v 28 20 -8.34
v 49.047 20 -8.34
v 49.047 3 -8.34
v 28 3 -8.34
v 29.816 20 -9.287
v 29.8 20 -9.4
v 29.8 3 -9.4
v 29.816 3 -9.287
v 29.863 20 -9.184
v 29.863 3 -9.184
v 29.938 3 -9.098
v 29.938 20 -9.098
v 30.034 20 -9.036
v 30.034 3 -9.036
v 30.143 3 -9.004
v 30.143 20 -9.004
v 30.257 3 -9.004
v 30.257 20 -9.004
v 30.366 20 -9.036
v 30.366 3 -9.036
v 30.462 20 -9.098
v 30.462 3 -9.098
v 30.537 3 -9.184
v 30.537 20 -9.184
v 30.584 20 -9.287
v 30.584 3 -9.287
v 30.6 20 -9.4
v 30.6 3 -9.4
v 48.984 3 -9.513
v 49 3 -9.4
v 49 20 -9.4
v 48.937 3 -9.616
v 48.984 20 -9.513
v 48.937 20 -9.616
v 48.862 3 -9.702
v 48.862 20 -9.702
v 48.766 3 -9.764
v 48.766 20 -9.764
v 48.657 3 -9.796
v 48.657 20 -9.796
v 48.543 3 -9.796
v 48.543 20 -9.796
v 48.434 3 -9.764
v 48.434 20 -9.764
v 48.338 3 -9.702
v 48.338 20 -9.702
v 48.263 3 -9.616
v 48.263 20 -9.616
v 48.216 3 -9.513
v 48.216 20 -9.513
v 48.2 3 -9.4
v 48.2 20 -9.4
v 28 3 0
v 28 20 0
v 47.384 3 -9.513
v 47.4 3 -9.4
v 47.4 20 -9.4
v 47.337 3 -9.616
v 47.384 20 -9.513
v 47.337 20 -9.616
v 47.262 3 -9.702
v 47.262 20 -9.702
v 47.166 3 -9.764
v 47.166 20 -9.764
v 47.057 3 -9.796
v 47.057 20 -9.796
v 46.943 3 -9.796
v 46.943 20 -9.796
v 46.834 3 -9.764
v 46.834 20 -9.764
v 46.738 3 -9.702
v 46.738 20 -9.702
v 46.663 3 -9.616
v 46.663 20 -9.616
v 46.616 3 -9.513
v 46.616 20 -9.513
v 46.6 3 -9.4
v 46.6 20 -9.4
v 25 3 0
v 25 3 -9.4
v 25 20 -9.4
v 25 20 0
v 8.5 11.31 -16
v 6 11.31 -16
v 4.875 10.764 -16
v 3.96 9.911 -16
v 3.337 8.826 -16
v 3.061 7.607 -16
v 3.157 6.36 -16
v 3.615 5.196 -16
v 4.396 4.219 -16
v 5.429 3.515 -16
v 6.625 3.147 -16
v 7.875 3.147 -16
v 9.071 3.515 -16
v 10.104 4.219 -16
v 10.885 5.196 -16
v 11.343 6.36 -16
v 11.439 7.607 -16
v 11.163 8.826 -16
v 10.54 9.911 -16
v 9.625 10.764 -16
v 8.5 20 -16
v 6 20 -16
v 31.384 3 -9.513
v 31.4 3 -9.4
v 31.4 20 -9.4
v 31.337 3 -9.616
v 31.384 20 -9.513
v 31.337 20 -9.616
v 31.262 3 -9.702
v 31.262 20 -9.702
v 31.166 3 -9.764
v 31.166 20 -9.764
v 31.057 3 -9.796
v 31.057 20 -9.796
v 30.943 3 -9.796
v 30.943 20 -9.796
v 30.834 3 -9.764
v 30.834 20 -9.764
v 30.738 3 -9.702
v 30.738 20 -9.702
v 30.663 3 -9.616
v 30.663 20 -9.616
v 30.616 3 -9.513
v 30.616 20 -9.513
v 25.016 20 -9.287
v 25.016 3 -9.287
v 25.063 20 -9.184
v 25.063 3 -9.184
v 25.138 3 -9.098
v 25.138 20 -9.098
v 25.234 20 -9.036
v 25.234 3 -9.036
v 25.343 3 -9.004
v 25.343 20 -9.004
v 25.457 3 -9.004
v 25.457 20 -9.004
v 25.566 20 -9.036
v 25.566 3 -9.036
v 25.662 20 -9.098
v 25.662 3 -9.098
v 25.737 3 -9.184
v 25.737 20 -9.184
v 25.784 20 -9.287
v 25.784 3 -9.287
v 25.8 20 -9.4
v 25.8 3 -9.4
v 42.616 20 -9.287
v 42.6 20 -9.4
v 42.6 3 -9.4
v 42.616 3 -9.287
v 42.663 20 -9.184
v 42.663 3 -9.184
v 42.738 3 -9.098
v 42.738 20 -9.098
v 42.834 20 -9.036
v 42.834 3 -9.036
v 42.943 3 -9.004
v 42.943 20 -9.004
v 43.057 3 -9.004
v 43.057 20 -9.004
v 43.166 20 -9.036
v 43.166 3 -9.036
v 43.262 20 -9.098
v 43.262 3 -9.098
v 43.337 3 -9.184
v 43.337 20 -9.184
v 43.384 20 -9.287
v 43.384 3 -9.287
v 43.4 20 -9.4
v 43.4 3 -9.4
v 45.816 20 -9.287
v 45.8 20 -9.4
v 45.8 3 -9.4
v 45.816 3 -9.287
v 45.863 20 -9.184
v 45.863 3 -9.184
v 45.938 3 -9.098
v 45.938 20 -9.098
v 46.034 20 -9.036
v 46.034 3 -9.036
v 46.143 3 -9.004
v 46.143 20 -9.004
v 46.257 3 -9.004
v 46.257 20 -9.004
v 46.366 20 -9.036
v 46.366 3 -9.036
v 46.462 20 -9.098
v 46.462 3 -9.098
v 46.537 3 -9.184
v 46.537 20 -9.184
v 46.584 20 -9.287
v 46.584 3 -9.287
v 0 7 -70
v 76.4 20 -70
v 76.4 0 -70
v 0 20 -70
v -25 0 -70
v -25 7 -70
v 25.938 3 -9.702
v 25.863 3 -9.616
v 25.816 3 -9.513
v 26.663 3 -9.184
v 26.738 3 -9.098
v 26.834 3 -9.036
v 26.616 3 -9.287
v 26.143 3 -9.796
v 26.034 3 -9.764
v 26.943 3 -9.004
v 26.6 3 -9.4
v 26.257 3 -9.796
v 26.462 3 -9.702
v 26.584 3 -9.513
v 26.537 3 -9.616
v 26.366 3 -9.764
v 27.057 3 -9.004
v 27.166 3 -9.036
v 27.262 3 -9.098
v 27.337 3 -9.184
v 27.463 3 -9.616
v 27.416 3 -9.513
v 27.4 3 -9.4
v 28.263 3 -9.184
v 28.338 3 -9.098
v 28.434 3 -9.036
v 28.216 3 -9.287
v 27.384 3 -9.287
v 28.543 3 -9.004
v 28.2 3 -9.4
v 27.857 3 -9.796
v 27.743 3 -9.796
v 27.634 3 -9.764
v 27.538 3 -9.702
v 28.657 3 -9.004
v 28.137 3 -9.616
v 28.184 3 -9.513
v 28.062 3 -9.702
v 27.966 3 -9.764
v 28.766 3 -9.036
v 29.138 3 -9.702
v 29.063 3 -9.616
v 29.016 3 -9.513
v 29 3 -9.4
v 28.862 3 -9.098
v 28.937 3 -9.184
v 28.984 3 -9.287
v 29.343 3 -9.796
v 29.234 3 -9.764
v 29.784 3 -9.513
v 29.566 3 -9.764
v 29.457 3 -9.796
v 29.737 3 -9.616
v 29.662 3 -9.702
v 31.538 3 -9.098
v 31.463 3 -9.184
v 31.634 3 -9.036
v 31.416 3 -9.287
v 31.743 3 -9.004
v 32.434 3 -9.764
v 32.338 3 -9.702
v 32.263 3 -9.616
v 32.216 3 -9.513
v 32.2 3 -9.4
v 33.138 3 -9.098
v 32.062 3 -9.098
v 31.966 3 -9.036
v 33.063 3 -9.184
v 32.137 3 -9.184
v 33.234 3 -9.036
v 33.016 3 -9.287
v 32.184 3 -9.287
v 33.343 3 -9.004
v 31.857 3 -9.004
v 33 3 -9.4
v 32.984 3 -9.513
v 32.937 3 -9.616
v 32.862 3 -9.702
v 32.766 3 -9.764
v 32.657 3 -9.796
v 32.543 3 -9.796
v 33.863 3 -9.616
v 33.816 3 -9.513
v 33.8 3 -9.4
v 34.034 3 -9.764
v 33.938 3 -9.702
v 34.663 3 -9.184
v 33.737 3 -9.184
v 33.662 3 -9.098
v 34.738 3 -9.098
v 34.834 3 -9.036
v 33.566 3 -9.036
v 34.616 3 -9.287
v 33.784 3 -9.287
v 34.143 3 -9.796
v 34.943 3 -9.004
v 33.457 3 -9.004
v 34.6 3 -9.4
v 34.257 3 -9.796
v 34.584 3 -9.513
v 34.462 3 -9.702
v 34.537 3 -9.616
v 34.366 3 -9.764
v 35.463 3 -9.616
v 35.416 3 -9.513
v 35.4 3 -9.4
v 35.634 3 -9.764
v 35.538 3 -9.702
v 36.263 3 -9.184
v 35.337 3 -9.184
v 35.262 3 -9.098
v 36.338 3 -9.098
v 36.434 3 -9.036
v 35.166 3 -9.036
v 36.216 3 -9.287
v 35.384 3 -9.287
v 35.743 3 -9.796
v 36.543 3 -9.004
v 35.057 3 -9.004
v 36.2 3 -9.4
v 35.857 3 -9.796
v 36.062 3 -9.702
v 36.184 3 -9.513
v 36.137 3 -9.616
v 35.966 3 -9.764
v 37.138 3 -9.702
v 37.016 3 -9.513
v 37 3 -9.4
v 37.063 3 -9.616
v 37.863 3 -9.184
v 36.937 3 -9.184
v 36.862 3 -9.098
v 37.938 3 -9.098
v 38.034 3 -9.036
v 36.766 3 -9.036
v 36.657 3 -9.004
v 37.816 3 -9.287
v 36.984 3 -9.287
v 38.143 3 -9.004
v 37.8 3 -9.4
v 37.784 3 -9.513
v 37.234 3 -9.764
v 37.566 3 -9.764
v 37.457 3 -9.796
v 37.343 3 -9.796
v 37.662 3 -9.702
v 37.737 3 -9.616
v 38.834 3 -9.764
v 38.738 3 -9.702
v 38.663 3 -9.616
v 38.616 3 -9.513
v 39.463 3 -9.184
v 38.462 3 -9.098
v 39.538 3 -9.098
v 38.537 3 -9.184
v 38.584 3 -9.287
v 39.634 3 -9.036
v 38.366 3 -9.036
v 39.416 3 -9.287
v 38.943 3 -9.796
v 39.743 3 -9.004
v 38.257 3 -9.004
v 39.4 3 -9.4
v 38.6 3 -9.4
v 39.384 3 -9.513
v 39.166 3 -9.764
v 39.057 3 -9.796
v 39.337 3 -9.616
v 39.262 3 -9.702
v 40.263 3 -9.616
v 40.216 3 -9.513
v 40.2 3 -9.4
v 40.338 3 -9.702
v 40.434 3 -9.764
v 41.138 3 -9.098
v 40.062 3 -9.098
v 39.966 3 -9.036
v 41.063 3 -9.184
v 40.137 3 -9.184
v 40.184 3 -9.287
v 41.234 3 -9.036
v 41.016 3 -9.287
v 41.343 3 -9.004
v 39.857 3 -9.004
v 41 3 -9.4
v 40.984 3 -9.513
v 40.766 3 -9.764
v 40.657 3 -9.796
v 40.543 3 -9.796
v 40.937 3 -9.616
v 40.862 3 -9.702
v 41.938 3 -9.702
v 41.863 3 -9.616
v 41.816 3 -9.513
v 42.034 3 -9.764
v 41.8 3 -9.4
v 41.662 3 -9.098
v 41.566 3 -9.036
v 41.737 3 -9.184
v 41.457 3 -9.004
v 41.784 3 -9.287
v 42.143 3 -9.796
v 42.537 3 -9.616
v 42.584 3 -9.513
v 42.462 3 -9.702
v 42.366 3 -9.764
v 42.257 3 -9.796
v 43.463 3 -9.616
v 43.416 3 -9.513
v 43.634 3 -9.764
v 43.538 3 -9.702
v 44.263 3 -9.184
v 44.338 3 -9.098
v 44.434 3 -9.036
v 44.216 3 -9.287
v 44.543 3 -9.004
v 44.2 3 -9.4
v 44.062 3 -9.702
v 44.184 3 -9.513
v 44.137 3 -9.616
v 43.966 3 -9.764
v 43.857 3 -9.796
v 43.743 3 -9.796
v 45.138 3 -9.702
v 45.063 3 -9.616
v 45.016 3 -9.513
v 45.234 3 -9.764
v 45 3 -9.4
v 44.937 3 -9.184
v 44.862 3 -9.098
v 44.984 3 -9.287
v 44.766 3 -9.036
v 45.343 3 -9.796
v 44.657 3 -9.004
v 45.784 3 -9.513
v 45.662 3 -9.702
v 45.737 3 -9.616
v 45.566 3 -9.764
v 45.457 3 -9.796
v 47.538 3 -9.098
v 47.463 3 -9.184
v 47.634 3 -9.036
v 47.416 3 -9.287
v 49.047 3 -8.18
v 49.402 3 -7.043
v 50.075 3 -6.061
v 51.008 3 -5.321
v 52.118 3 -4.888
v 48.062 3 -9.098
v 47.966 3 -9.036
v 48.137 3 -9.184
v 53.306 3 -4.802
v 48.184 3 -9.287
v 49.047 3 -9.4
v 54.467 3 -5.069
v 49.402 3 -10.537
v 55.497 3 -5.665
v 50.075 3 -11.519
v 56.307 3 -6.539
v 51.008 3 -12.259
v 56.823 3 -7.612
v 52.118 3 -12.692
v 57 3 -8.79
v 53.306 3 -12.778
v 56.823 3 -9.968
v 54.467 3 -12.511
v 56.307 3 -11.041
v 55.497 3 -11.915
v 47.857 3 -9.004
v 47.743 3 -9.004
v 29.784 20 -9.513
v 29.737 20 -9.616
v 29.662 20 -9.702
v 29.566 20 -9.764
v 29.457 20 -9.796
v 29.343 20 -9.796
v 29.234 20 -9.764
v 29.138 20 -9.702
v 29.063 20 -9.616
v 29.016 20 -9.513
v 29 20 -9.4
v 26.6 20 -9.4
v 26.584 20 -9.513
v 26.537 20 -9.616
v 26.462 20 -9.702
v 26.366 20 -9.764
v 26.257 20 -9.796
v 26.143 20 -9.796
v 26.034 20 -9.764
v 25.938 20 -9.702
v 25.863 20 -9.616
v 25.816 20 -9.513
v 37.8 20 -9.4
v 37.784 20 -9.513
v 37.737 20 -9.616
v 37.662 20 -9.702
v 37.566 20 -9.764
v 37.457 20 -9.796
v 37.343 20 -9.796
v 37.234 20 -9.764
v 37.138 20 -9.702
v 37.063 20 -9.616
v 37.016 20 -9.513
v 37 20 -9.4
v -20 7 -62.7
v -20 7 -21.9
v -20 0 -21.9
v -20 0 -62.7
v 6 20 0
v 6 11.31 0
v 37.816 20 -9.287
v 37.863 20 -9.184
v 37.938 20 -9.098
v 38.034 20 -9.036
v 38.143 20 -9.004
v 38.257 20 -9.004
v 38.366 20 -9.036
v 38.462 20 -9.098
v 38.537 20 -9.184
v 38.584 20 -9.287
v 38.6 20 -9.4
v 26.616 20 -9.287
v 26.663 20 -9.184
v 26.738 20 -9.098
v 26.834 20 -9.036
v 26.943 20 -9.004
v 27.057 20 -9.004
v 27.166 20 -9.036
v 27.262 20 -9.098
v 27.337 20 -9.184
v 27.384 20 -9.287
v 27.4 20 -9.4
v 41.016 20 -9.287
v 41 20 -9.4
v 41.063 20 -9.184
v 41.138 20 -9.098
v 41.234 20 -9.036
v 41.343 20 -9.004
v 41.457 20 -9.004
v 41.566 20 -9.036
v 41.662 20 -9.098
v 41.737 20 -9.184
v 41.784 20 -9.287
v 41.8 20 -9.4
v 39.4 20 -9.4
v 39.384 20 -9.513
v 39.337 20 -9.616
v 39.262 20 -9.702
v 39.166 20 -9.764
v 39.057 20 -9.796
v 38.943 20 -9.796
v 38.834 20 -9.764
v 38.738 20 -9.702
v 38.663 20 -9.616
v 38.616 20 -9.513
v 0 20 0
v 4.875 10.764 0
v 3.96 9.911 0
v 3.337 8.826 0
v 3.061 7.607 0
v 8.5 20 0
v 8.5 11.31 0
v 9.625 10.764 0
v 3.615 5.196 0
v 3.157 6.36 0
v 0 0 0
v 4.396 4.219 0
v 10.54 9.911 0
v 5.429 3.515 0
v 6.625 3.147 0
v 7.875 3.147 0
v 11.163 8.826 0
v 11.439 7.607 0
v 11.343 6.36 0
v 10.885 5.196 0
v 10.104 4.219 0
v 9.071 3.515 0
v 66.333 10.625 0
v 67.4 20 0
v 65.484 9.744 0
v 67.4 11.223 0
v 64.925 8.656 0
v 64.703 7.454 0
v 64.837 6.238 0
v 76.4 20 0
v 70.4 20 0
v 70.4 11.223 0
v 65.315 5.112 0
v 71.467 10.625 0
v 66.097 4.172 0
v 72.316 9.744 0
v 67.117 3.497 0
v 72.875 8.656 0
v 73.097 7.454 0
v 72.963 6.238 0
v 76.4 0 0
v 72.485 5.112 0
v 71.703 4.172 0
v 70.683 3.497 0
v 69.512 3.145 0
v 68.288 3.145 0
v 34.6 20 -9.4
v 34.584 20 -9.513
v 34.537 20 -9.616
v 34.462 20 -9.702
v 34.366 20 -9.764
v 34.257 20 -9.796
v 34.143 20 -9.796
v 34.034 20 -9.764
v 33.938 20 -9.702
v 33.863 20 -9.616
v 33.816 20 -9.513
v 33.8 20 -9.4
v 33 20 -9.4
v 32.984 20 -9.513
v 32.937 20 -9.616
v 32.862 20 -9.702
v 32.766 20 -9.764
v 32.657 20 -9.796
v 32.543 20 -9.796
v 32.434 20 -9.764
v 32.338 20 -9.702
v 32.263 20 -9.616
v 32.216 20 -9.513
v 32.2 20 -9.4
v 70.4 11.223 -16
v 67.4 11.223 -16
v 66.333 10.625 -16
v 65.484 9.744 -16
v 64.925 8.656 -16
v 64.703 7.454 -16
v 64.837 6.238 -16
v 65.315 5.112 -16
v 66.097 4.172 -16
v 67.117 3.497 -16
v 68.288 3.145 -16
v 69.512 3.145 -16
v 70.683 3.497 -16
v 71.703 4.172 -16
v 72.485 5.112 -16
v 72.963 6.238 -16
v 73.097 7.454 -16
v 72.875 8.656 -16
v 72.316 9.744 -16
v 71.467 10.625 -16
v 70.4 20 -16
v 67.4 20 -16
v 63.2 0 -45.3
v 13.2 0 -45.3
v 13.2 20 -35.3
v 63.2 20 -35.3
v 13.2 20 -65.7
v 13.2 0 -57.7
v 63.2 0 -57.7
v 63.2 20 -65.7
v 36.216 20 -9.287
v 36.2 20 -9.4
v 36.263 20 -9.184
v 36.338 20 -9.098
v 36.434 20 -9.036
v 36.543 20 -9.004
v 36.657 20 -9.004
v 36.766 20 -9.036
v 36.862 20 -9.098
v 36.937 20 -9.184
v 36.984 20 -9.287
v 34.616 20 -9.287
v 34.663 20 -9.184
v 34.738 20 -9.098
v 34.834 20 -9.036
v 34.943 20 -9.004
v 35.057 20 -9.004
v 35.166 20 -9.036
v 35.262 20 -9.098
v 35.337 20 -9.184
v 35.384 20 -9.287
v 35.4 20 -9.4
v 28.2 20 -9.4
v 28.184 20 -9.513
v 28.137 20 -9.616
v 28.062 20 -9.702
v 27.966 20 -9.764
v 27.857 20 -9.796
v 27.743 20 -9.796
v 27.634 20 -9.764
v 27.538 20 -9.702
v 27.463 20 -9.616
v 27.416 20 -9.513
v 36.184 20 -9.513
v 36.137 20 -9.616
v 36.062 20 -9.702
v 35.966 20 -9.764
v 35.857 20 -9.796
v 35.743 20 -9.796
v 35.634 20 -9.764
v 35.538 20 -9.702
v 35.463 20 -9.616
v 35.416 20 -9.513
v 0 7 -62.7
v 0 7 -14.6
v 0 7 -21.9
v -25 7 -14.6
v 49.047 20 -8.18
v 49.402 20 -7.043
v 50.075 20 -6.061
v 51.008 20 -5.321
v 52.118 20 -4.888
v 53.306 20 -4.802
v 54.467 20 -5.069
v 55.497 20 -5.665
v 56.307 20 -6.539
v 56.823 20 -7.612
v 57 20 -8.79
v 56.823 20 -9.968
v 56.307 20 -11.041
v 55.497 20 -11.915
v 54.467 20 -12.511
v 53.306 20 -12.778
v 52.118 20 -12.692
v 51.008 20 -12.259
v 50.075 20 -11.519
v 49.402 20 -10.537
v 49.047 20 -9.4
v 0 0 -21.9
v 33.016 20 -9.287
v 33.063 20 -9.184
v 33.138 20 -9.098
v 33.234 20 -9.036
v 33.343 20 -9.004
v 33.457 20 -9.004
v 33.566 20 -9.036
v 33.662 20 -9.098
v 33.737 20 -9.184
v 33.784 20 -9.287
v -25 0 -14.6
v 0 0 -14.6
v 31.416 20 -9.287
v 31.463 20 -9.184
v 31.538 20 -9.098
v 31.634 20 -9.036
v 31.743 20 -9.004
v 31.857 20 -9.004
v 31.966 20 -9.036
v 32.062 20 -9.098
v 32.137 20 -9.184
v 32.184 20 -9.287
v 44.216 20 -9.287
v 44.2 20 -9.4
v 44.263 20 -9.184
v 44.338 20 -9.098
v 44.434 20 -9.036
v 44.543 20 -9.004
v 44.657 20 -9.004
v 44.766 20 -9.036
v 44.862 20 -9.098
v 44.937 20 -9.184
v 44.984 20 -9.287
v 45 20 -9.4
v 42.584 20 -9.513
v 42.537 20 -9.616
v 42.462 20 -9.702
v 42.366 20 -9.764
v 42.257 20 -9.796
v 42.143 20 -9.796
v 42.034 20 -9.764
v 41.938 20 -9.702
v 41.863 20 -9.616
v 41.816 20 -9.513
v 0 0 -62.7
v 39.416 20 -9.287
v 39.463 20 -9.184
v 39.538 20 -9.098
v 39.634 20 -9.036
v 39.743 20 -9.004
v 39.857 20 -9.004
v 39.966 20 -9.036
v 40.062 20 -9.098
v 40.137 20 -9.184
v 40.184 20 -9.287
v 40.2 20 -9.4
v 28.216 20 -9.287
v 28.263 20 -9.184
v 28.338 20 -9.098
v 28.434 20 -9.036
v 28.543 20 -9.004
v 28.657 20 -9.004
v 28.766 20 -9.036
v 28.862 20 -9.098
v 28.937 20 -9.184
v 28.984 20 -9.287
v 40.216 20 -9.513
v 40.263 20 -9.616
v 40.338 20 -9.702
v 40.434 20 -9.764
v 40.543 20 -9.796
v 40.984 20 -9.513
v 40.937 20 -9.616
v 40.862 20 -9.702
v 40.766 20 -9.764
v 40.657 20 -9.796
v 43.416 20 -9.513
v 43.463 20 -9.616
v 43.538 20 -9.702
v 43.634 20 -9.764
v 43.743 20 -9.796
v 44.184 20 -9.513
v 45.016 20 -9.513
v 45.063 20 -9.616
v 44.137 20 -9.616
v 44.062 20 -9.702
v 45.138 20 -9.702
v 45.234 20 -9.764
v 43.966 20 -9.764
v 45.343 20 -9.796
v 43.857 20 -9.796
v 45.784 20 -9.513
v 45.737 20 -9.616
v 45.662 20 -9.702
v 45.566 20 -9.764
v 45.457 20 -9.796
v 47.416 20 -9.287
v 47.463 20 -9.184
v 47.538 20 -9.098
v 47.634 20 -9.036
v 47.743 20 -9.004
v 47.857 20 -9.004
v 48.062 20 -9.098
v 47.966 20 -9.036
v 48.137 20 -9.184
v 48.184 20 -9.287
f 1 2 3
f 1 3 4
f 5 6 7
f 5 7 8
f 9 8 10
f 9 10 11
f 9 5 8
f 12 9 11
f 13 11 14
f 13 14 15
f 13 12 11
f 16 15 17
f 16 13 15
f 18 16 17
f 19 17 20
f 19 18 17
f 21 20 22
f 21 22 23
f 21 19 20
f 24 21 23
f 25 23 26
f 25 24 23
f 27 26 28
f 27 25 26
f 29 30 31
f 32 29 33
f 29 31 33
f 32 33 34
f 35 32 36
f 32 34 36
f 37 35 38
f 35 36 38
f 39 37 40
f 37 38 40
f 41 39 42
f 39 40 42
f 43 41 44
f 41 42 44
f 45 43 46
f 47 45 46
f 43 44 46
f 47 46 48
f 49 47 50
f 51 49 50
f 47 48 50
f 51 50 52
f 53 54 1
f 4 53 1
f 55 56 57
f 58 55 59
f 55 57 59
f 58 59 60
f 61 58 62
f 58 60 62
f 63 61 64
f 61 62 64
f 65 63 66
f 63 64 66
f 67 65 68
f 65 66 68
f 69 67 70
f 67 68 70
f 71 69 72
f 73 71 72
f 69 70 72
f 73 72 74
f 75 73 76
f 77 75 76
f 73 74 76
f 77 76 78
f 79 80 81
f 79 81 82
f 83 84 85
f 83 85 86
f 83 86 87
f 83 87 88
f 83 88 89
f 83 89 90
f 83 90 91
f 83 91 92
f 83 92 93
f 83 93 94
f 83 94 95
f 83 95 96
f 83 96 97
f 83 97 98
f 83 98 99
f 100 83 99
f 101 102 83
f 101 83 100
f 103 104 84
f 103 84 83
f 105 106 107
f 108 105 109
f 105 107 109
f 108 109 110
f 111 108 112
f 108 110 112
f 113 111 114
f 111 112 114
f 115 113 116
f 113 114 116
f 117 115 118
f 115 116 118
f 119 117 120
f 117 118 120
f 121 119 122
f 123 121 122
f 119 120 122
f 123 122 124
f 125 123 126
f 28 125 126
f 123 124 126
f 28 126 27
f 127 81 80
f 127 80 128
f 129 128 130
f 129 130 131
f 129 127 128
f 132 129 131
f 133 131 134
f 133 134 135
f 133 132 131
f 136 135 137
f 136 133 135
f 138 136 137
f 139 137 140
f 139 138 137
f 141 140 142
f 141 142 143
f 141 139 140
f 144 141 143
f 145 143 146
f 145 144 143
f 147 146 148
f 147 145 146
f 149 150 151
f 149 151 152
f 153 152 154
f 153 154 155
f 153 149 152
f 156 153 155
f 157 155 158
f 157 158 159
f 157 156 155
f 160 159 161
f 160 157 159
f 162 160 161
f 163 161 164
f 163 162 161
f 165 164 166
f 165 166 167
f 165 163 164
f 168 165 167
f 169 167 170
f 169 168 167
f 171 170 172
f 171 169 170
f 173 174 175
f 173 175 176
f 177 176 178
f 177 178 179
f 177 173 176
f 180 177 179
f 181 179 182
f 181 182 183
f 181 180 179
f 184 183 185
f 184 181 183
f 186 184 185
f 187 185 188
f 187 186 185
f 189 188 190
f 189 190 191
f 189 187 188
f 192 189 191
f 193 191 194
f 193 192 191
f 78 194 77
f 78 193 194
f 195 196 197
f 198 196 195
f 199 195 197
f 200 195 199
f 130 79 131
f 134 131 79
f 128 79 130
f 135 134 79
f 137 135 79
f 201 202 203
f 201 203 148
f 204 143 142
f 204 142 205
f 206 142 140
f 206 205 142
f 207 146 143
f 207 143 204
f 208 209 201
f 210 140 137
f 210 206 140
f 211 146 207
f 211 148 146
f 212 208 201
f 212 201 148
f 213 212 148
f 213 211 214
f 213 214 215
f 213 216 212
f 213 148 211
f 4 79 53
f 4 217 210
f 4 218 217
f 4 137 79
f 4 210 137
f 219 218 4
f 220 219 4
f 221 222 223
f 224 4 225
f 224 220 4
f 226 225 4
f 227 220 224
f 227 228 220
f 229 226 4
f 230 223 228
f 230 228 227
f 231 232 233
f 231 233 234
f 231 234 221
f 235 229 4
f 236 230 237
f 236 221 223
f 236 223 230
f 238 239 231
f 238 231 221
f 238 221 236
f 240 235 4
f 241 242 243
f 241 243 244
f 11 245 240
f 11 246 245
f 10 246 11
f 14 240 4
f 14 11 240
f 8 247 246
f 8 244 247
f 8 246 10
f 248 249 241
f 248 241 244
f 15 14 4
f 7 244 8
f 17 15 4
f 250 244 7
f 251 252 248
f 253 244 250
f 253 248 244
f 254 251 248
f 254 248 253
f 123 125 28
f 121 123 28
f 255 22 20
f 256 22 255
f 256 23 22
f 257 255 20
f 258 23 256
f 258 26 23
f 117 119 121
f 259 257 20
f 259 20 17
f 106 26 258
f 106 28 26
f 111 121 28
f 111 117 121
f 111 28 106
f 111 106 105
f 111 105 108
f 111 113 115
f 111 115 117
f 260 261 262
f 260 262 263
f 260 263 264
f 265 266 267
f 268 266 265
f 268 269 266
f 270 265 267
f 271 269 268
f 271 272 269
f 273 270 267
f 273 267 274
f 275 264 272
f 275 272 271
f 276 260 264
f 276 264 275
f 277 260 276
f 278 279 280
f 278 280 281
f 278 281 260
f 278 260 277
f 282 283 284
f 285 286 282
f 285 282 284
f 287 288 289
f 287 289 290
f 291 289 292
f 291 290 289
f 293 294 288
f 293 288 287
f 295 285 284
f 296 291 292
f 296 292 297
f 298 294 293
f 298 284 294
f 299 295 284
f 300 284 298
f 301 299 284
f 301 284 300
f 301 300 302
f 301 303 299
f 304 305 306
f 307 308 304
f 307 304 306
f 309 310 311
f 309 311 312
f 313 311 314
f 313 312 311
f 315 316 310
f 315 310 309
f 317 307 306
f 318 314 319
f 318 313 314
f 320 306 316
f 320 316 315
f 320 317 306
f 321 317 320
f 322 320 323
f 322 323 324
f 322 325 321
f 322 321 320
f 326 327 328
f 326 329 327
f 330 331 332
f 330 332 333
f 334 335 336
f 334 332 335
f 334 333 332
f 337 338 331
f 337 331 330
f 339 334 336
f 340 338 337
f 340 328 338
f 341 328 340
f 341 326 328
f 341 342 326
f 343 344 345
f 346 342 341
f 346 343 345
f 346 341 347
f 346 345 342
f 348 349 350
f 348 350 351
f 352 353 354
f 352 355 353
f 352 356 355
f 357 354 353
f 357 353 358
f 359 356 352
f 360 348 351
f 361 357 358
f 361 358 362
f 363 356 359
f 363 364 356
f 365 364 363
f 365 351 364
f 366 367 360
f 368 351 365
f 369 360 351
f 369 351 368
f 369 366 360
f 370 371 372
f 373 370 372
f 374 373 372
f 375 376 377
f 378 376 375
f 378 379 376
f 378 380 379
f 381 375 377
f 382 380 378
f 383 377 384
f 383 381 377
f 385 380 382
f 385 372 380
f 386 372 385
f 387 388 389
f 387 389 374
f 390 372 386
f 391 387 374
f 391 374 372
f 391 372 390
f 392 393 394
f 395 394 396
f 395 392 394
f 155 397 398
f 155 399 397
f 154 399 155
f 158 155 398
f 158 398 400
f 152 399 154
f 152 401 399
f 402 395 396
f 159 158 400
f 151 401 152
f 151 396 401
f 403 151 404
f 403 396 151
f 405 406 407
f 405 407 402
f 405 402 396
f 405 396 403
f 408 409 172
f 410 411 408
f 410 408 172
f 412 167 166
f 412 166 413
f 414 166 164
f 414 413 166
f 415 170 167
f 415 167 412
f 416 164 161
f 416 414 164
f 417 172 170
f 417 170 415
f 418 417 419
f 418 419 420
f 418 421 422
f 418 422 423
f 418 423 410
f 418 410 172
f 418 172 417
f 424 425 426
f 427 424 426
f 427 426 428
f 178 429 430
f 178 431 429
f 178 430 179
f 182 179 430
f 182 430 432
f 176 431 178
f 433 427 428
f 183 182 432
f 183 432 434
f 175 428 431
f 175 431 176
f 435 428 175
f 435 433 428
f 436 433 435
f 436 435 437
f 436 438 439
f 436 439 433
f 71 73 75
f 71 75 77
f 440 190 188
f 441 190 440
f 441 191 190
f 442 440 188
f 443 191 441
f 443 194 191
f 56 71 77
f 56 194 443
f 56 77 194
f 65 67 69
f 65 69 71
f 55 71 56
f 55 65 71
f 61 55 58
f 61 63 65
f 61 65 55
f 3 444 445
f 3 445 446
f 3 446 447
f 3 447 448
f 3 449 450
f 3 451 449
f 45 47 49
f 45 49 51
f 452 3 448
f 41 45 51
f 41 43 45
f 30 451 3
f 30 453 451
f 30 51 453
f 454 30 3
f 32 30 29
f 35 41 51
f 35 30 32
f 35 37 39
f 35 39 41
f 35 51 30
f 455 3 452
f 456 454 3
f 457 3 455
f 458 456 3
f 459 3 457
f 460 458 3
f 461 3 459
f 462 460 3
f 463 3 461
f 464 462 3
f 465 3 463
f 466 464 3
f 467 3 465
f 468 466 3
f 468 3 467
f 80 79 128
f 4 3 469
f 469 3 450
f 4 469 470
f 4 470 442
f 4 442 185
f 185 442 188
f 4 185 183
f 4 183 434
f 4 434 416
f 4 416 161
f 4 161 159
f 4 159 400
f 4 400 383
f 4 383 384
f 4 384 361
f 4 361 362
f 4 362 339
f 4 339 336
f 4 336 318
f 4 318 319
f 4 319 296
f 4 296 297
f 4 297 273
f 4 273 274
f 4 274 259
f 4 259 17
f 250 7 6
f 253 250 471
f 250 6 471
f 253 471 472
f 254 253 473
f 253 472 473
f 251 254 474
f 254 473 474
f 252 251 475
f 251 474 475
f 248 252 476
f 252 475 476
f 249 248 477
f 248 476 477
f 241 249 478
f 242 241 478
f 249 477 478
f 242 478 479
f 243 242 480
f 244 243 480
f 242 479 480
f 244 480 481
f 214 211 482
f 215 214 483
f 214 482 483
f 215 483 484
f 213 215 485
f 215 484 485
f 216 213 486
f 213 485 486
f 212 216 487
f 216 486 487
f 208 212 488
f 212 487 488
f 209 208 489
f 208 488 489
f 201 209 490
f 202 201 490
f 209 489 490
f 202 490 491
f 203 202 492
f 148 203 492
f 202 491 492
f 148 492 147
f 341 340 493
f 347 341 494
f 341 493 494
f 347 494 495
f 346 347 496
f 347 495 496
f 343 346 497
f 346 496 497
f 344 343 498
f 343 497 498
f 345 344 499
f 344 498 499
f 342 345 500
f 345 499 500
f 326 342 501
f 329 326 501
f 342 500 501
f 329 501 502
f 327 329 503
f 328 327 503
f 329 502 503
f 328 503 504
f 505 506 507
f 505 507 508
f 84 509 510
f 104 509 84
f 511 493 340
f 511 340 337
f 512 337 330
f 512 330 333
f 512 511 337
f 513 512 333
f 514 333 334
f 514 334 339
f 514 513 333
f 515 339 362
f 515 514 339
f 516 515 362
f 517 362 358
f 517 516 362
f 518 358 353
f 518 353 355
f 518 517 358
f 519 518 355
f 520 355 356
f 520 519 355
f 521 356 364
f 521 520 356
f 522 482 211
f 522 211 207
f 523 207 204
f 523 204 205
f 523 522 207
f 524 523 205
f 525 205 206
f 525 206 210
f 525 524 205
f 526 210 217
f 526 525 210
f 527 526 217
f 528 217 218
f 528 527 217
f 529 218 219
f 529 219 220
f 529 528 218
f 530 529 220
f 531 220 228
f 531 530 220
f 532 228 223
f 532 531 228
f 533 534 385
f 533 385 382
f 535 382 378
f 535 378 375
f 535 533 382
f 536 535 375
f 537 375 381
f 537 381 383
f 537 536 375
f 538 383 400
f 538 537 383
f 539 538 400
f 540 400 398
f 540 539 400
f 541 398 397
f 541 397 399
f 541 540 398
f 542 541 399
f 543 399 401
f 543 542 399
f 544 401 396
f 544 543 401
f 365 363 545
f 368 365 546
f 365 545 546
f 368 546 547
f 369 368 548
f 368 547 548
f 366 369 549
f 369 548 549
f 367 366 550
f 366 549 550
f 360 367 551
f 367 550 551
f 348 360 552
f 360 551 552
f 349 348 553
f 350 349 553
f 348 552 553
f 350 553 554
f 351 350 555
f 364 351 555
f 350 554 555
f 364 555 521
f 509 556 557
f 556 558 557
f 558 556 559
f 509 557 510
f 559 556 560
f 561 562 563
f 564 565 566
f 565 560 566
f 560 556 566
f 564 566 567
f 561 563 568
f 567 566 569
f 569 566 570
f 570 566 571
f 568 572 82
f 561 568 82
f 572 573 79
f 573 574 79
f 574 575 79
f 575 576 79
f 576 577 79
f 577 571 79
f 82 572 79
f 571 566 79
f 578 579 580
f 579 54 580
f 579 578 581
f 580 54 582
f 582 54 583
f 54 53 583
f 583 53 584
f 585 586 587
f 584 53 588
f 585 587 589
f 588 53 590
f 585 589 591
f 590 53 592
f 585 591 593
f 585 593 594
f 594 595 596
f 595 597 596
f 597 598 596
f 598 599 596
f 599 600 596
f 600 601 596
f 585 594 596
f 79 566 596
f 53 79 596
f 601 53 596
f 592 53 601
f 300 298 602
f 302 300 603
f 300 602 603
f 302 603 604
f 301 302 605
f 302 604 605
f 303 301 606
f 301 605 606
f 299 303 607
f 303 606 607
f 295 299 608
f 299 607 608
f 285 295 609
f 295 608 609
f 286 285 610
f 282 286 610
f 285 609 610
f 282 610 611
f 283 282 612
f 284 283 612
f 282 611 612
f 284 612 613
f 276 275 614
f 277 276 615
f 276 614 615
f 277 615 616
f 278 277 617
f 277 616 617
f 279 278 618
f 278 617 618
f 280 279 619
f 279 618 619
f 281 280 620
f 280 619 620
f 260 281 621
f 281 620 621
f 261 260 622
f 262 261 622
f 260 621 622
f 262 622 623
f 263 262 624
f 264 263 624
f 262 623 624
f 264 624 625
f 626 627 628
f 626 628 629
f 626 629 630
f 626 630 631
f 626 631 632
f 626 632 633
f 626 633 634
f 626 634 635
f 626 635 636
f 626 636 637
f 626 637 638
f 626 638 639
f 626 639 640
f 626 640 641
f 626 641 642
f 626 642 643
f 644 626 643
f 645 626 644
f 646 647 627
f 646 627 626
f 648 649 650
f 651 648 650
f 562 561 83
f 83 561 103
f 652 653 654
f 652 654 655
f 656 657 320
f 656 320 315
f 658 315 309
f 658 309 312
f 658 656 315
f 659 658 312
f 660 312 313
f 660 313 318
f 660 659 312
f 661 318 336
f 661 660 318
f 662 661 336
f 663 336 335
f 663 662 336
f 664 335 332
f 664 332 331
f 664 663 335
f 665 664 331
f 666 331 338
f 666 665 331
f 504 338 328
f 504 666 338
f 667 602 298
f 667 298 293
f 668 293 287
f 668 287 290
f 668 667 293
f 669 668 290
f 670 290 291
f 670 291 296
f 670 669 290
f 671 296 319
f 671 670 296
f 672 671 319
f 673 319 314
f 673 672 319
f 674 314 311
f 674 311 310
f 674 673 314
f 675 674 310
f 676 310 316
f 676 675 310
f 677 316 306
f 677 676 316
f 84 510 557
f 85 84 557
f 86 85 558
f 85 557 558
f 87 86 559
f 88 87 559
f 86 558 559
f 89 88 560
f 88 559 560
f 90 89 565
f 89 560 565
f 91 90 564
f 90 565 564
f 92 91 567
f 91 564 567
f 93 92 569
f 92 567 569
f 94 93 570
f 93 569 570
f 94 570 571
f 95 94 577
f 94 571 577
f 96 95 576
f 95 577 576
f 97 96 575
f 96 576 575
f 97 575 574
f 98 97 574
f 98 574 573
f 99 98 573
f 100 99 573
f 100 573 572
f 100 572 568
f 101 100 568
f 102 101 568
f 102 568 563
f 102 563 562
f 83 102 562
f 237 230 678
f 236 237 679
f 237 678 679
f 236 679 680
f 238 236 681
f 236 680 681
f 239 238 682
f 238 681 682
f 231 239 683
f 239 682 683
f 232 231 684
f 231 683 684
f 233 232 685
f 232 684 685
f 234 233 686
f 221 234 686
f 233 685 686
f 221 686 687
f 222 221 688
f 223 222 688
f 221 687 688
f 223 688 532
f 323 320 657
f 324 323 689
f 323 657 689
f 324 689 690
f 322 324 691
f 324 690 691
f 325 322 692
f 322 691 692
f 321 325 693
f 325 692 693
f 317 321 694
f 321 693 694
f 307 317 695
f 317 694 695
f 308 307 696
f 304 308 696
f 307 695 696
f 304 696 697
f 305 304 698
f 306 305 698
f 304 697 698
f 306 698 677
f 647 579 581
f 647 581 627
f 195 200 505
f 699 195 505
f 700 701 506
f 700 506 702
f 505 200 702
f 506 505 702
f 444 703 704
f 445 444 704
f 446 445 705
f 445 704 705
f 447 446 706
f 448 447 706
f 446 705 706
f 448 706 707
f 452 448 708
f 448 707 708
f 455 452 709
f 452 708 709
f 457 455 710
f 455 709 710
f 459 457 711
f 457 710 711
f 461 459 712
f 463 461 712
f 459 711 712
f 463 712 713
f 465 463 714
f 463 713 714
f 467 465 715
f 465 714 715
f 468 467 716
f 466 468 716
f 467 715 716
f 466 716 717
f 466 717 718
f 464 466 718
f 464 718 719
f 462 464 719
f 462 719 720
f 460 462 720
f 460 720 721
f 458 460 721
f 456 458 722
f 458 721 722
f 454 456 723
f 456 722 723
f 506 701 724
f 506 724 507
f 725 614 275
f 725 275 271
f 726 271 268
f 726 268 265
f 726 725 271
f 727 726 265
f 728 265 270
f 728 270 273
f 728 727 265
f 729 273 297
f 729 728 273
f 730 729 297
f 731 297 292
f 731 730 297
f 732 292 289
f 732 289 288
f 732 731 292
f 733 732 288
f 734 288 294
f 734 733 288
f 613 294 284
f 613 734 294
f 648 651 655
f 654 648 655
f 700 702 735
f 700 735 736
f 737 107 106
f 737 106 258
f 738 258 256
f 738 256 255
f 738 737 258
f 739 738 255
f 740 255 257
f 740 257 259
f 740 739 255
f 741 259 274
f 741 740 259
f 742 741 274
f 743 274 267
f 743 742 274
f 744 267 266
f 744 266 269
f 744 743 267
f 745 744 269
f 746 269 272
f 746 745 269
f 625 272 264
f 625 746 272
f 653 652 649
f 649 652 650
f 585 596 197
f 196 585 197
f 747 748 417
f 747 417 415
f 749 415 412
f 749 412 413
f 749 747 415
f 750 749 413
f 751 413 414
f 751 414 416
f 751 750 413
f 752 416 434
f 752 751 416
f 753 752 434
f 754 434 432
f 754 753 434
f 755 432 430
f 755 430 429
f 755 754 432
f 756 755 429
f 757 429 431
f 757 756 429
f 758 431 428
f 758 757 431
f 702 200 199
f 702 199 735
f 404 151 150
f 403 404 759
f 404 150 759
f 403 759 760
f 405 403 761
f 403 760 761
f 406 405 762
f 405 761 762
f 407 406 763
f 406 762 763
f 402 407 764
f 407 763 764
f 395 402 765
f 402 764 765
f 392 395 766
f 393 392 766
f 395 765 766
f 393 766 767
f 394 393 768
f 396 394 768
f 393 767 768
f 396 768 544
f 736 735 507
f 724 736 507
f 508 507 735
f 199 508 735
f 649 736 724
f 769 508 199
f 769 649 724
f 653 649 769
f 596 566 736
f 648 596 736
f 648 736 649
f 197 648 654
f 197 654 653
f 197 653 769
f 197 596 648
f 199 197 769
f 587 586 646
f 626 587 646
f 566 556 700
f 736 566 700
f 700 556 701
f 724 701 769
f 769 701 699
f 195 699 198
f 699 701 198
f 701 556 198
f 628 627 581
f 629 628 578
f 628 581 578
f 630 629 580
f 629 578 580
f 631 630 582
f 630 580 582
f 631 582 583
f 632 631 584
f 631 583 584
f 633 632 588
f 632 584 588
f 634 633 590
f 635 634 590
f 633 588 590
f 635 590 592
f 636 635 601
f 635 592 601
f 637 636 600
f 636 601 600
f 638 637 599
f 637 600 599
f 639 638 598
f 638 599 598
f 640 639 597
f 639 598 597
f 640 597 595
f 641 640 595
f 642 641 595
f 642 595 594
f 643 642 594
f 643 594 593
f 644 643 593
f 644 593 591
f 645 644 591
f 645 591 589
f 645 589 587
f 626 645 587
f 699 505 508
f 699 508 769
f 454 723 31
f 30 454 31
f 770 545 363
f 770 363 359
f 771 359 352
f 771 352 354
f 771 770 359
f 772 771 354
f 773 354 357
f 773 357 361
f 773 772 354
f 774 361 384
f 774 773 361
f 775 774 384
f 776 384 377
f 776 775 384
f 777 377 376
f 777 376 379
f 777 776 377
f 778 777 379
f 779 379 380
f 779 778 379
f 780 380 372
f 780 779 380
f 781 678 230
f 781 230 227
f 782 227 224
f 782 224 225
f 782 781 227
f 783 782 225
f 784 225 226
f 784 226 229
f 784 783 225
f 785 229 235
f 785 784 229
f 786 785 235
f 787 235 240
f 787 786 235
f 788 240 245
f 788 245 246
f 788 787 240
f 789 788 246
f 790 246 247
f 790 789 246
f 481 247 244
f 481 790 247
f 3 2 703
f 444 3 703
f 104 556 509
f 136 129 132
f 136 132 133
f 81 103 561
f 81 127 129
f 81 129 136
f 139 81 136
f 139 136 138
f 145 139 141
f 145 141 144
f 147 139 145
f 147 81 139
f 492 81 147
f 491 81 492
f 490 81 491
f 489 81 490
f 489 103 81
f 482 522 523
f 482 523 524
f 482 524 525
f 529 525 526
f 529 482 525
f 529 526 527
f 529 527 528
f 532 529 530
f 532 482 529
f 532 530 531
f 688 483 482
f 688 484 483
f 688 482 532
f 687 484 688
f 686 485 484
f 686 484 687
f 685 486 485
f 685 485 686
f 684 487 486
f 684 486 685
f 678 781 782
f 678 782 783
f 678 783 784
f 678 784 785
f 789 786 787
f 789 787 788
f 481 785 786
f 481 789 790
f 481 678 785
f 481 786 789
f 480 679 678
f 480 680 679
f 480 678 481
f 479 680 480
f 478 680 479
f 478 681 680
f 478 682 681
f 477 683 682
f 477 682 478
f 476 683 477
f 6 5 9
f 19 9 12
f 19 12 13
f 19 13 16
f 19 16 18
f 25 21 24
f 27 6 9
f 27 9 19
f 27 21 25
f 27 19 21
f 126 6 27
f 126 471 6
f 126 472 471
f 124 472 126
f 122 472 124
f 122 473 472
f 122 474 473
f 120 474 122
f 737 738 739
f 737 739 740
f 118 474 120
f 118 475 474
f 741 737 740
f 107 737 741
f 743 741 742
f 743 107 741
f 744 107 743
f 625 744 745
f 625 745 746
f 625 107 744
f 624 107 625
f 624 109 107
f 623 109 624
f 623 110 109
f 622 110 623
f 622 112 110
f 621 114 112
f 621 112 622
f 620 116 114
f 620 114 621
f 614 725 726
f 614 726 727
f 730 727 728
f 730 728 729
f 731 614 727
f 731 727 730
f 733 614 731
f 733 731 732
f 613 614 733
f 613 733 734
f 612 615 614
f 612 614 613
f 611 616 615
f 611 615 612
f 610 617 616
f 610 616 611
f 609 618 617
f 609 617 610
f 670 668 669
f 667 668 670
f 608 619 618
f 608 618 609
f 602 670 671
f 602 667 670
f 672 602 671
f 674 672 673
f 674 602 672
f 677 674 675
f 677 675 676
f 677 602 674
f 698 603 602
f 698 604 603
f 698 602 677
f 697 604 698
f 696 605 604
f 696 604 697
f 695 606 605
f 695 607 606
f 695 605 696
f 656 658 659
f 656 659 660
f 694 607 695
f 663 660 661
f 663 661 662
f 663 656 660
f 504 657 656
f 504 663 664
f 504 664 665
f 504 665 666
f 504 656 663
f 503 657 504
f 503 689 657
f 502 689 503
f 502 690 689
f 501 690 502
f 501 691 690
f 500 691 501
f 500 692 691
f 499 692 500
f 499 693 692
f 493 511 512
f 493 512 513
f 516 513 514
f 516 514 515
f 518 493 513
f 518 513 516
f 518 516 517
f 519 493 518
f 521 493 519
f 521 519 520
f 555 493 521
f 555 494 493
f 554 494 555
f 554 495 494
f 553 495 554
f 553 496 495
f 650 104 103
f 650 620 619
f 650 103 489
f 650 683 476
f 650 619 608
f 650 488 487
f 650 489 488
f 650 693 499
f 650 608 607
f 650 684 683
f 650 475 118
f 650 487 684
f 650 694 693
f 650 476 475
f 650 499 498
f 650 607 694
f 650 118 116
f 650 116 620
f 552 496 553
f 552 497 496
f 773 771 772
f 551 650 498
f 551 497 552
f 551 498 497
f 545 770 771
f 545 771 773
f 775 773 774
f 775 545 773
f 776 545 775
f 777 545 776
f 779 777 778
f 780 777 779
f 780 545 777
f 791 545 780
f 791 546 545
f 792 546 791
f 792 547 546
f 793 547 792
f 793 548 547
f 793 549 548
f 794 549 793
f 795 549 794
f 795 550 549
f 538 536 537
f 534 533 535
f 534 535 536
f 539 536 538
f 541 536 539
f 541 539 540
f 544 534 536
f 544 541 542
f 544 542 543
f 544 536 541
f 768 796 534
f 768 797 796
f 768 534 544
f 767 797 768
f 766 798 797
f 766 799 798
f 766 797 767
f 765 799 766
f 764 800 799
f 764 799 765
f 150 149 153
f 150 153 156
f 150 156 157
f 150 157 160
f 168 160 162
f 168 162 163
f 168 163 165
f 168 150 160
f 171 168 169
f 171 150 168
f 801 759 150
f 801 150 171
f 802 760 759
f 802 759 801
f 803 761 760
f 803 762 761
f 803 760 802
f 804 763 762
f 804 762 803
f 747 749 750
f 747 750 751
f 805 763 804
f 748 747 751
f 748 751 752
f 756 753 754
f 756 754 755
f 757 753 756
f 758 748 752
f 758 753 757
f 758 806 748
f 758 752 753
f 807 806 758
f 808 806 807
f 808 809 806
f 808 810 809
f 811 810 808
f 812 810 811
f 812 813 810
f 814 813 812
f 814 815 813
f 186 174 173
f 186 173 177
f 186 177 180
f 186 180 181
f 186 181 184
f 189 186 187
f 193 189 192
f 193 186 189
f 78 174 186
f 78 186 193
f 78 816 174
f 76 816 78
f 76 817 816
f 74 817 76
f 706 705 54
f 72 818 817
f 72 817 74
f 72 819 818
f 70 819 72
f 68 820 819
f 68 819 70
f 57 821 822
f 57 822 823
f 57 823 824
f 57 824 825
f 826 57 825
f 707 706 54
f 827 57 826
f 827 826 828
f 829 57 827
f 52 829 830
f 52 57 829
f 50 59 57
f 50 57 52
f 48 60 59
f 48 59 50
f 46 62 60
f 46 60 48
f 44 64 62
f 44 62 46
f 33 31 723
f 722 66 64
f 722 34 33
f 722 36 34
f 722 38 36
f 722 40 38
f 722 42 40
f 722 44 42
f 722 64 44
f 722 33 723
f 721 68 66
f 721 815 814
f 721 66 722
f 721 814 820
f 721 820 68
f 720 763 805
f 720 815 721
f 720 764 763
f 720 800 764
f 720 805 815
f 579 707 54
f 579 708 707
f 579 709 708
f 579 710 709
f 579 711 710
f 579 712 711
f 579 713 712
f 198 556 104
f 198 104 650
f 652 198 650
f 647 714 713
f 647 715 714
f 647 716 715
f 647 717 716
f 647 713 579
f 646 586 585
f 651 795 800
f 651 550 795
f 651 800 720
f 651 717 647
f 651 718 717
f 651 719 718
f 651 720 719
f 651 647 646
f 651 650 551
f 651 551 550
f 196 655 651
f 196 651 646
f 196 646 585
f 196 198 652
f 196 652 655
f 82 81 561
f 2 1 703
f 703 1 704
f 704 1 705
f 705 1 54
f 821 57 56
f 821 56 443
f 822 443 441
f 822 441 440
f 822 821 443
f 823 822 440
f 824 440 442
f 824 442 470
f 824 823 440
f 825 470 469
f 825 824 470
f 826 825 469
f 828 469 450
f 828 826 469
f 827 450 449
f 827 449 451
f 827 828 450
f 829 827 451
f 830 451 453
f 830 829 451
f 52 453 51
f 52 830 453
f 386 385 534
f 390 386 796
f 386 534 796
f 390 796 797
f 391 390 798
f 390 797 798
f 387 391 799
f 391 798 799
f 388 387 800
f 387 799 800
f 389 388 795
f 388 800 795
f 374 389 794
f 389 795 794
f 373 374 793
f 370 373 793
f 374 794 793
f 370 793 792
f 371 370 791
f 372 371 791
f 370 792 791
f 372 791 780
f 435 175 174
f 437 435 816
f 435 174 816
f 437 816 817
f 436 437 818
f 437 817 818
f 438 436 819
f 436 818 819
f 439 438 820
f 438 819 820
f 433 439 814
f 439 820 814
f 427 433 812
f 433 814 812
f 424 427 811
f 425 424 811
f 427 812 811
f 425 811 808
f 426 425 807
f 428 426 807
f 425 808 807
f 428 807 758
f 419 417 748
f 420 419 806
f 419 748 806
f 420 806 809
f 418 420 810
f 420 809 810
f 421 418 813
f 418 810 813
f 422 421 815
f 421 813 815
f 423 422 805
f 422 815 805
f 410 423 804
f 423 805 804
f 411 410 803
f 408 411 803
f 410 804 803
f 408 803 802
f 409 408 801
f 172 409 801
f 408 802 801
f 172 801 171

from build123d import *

# Parameters (mm, degrees)
BOSS_EXTRUDE1_DEPTH  = 20
SKETCH2_R            = 4
CUT_EXTRUDE1_DEPTH   = 17
BOSS_EXTRUDE4_DEPTH  = 17
LPATTERN14_COUNT     = 15
LPATTERN14_PITCH     = 1.6
CUT_EXTRUDE4_DEPTH   = 17
LPATTERN15_COUNT     = 15
LPATTERN15_PITCH     = 1.6
BOSS_EXTRUDE5_DEPTH  = 17
SKETCH10_W           = 2.5
SKETCH10_H           = 16
SKETCH10_W_2         = 3
CUT_EXTRUDE5_DEPTH   = 8.5
CUT_EXTRUDE7_DEPTH   = 16
SKETCH11_4_R         = 4.2
CUT_EXTRUDE8_DEPTH   = 16
CUT_EXTRUDE9_DEPTH   = 16
SKETCH12_3_R         = 4.2
CUT_EXTRUDE10_DEPTH  = 16
SKETCH19_W           = 5
SKETCH19_H           = 40.8
BOSS_EXTRUDE8_DEPTH  = 20
CUT_EXTRUDE11_DEPTH  = 6
SKETCH23_W           = 50
SKETCH23_H           = 4
SKETCH23_H_2         = 9.2
SKETCH23_H_3         = 17.2
CUT_EXTRUDE12_DEPTH  = 106.531796156
CUT_EXTRUDE15_REACH  = 126.828
SKETCH28_W           = 55.4
SKETCH28_H           = 7
BOSS_EXTRUDE10_REACH = 116.365


with BuildPart() as part:
    # Sketch1 → Boss-Extrude1 (new body)
    with BuildSketch(Plane(origin=(0, 0, 0), x_dir=(1, 0, 0), z_dir=(0, 1, 0))):
        Polygon((0, 0), (76.4, 0), (76.4, 16), (76.4, 70), (0, 70), align=None)
    extrude(amount=BOSS_EXTRUDE1_DEPTH)

    # Sketch2 → Cut-Extrude1 (cut)
    with BuildSketch(Plane(origin=(0, 20, 0), x_dir=(1, 0, 0), z_dir=(0, 1, 0))):
        with BuildLine():
            Line((25, 9.4), (25, 0))
            Line((25, 0), (28, 0))
            Line((28, 0), (28, 8.18))
            Line((28, 8.18), (49, 8.18))
            Line((49, 8.18), (49.046786118, 8.18))
            ThreePointArc((49.046786118, 8.18), (49, 8.79), (49.046786118, 9.4))
            Line((49.046786118, 9.4), (49, 9.4))
            Line((49, 9.4), (28, 9.4))
            Line((28, 9.4), (25, 9.4))
        make_face()
        with Locations((53, 8.79)):
            Circle(SKETCH2_R)
    extrude(amount=-CUT_EXTRUDE1_DEPTH, mode=Mode.SUBTRACT)

    # Sketch4 → Boss-Extrude4 (add)
    with BuildSketch(Plane(origin=(0, 20, 0), x_dir=(1, 0, 0), z_dir=(0, 1, 0))):
        with BuildLine():
            Line((25.4, 9.4), (25, 9.4))
            ThreePointArc((25, 9.4), (25.4, 9), (25.8, 9.4))
            Line((25.8, 9.4), (25.4, 9.4))
        make_face()
    boss_extrude4 = extrude(amount=-BOSS_EXTRUDE4_DEPTH)

    # LPattern14: Boss-Extrude4 ×15
    with Locations(*[(i * LPATTERN14_PITCH, 0, 0) for i in range(1, LPATTERN14_COUNT)]):
        add(boss_extrude4)

    # Sketch8 → Cut-Extrude4 (cut)
    with BuildSketch(Plane(origin=(0, 20, 0), x_dir=(1, 0, 0), z_dir=(0, 1, 0))):
        with BuildLine():
            Line((25.8, 9.4), (26.6, 9.4))
            ThreePointArc((26.6, 9.4), (26.2, 9.8), (25.8, 9.4))
        make_face()
    cut_extrude4 = extrude(amount=-CUT_EXTRUDE4_DEPTH, mode=Mode.SUBTRACT)

    # LPattern15: Cut-Extrude4 ×15
    with Locations(*[(i * LPATTERN15_PITCH, 0, 0) for i in range(1, LPATTERN15_COUNT)]):
        add(cut_extrude4, mode=Mode.SUBTRACT)

    # Sketch9 → Boss-Extrude5 (add)
    with BuildSketch(Plane(origin=(0, 20, 0), x_dir=(1, 0, 0), z_dir=(0, 1, 0))):
        Polygon((28, 8.18), (28, 8.34), (48.939227735, 8.34), (49.046786118, 8.34), (49.046786118, 8.18), align=None)
    extrude(amount=-BOSS_EXTRUDE5_DEPTH)

    # Sketch10 → Cut-Extrude5 (cut)
    with BuildSketch(Plane(origin=(0, 20, 0), x_dir=(1, 0, 0), z_dir=(0, 1, 0))):
        with Locations((7.25, 8)):
            Rectangle(SKETCH10_W, SKETCH10_H)
        with Locations((68.9, 8)):
            Rectangle(SKETCH10_W_2, SKETCH10_H)
    extrude(amount=-CUT_EXTRUDE5_DEPTH, mode=Mode.SUBTRACT)

    # Sketch11 → Cut-Extrude7 (cut)
    with BuildSketch(Plane.XY):
        with BuildLine():
            Line((7.25, 11.5), (6, 11.5))
            Line((6, 11.5), (6, 11.309675797))
            ThreePointArc((6, 11.309675797), (6.617796848, 11.452146333), (7.25, 11.5))
        make_face()
        with BuildLine():
            Line((8.5, 11.5), (7.25, 11.5))
            ThreePointArc((7.25, 11.5), (7.882203152, 11.452146333), (8.5, 11.309675797))
            Line((8.5, 11.309675797), (8.5, 11.5))
        make_face()
    extrude(amount=-CUT_EXTRUDE7_DEPTH, mode=Mode.SUBTRACT)

    # Sketch11<4> → Cut-Extrude8 (cut)
    with BuildSketch(Plane.XY):
        with Locations((7.25, 7.3)):
            Circle(SKETCH11_4_R)
    extrude(amount=-CUT_EXTRUDE8_DEPTH, mode=Mode.SUBTRACT)

    # Sketch12 → Cut-Extrude9 (cut)
    with BuildSketch(Plane.XY):
        with BuildLine():
            Line((68.9, 11.5), (67.4, 11.5))
            Line((67.4, 11.5), (67.4, 11.223009049))
            ThreePointArc((67.4, 11.223009049), (68.13731986, 11.430171789), (68.9, 11.5))
        make_face()
        with BuildLine():
            Line((70.4, 11.5), (68.9, 11.5))
            ThreePointArc((68.9, 11.5), (69.66268014, 11.430171789), (70.4, 11.223009049))
            Line((70.4, 11.223009049), (70.4, 11.5))
        make_face()
    extrude(amount=-CUT_EXTRUDE9_DEPTH, mode=Mode.SUBTRACT)

    # Sketch12<3> → Cut-Extrude10 (cut)
    with BuildSketch(Plane.XY):
        with Locations((68.9, 7.3)):
            Circle(SKETCH12_3_R)
    extrude(amount=-CUT_EXTRUDE10_DEPTH, mode=Mode.SUBTRACT)

    # Sketch19 → Boss-Extrude8 (add)
    with BuildSketch(Plane(origin=(0, 20, 0), x_dir=(1, 0, 0), z_dir=(0, 1, 0))):
        Polygon((0, 62.7), (0, 70), (-25, 70), (-25, 62.7), (-20, 62.7), align=None)
        with Locations((-22.5, 42.3)):
            Rectangle(SKETCH19_W, SKETCH19_H)
        Polygon((0, 14.6), (0, 21.9), (-20, 21.9), (-25, 21.9), (-25, 14.6), align=None)
    extrude(amount=-BOSS_EXTRUDE8_DEPTH)

    # Sketch22 → Cut-Extrude11 (cut)
    with BuildSketch(Plane(origin=(0, 20, 0), x_dir=(1, 0, 0), z_dir=(0, 1, 0))):
        Polygon((-25, 14.6), (0, 14.6), (0, 21.9), (-20, 21.9), (-20, 62.7), (0, 62.7), (0, 70), (-25, 70), align=None)
    extrude(amount=-CUT_EXTRUDE11_DEPTH, mode=Mode.SUBTRACT)

    # Sketch23 → Cut-Extrude12 (cut, through all)
    with BuildSketch(Plane(origin=(0, 20, 0), x_dir=(1, 0, 0), z_dir=(0, 1, 0))):
        with Locations((38.2, 63.7)):
            Rectangle(SKETCH23_W, SKETCH23_H)
        with Locations((38.2, 57.1)):
            Rectangle(SKETCH23_W, SKETCH23_H_2)
        with Locations((38.2, 43.9)):
            Rectangle(SKETCH23_W, SKETCH23_H_3)
    extrude(amount=-CUT_EXTRUDE12_DEPTH, mode=Mode.SUBTRACT)

    # Cut-Extrude15: up to this face of the body (flat: up to its plane)
    cut_extrude15_end = Plane(part.part.faces().sort_by_distance((0, 10.512880562, -33.751990632))[0])
    # Sketch28 → Cut-Extrude15 (cut, up to the picked face)
    with BuildSketch(Plane.ZY.offset(25), mode=Mode.PRIVATE) as cut_extrude15_sk1:
        with Locations((-42.3, 10.5)):
            Rectangle(SKETCH28_W, SKETCH28_H)
    cut_extrude15_tool1 = split(extrude(cut_extrude15_sk1.sketch, amount=-CUT_EXTRUDE15_REACH, mode=Mode.PRIVATE), bisect_by=cut_extrude15_end, keep=Keep.BOTH, mode=Mode.PRIVATE)
    add(cut_extrude15_tool1.solids().sort_by(Axis((-25, 10.5, -42.3), (1, 0, 0)))[0], mode=Mode.SUBTRACT)

    # Sketch29 → Boss-Extrude10 (add, up to next)
    with BuildSketch(Plane.ZY.offset(-63.2), mode=Mode.PRIVATE) as boss_extrude10_sk1:
        Polygon((-65.7, 0), (-57.7, 0), (-65.7, 20), align=None)
    boss_extrude10_tool1 = extrude(boss_extrude10_sk1.sketch, amount=BOSS_EXTRUDE10_REACH, mode=Mode.PRIVATE) - part.part
    # Sketch29 → Boss-Extrude10 (add, up to next)
    with BuildSketch(Plane.ZY.offset(-63.2), mode=Mode.PRIVATE) as boss_extrude10_sk2:
        Polygon((-35.3, 0), (-45.3, 0), (-35.3, 20), align=None)
    boss_extrude10_tool2 = extrude(boss_extrude10_sk2.sketch, amount=BOSS_EXTRUDE10_REACH, mode=Mode.PRIVATE) - part.part
    add(boss_extrude10_tool1.solids().sort_by_distance((63.2, 6.666667, -63.033333))[0])
    add(boss_extrude10_tool2.solids().sort_by_distance((63.2, 6.666667, -38.633333))[0])


solid = part.part
